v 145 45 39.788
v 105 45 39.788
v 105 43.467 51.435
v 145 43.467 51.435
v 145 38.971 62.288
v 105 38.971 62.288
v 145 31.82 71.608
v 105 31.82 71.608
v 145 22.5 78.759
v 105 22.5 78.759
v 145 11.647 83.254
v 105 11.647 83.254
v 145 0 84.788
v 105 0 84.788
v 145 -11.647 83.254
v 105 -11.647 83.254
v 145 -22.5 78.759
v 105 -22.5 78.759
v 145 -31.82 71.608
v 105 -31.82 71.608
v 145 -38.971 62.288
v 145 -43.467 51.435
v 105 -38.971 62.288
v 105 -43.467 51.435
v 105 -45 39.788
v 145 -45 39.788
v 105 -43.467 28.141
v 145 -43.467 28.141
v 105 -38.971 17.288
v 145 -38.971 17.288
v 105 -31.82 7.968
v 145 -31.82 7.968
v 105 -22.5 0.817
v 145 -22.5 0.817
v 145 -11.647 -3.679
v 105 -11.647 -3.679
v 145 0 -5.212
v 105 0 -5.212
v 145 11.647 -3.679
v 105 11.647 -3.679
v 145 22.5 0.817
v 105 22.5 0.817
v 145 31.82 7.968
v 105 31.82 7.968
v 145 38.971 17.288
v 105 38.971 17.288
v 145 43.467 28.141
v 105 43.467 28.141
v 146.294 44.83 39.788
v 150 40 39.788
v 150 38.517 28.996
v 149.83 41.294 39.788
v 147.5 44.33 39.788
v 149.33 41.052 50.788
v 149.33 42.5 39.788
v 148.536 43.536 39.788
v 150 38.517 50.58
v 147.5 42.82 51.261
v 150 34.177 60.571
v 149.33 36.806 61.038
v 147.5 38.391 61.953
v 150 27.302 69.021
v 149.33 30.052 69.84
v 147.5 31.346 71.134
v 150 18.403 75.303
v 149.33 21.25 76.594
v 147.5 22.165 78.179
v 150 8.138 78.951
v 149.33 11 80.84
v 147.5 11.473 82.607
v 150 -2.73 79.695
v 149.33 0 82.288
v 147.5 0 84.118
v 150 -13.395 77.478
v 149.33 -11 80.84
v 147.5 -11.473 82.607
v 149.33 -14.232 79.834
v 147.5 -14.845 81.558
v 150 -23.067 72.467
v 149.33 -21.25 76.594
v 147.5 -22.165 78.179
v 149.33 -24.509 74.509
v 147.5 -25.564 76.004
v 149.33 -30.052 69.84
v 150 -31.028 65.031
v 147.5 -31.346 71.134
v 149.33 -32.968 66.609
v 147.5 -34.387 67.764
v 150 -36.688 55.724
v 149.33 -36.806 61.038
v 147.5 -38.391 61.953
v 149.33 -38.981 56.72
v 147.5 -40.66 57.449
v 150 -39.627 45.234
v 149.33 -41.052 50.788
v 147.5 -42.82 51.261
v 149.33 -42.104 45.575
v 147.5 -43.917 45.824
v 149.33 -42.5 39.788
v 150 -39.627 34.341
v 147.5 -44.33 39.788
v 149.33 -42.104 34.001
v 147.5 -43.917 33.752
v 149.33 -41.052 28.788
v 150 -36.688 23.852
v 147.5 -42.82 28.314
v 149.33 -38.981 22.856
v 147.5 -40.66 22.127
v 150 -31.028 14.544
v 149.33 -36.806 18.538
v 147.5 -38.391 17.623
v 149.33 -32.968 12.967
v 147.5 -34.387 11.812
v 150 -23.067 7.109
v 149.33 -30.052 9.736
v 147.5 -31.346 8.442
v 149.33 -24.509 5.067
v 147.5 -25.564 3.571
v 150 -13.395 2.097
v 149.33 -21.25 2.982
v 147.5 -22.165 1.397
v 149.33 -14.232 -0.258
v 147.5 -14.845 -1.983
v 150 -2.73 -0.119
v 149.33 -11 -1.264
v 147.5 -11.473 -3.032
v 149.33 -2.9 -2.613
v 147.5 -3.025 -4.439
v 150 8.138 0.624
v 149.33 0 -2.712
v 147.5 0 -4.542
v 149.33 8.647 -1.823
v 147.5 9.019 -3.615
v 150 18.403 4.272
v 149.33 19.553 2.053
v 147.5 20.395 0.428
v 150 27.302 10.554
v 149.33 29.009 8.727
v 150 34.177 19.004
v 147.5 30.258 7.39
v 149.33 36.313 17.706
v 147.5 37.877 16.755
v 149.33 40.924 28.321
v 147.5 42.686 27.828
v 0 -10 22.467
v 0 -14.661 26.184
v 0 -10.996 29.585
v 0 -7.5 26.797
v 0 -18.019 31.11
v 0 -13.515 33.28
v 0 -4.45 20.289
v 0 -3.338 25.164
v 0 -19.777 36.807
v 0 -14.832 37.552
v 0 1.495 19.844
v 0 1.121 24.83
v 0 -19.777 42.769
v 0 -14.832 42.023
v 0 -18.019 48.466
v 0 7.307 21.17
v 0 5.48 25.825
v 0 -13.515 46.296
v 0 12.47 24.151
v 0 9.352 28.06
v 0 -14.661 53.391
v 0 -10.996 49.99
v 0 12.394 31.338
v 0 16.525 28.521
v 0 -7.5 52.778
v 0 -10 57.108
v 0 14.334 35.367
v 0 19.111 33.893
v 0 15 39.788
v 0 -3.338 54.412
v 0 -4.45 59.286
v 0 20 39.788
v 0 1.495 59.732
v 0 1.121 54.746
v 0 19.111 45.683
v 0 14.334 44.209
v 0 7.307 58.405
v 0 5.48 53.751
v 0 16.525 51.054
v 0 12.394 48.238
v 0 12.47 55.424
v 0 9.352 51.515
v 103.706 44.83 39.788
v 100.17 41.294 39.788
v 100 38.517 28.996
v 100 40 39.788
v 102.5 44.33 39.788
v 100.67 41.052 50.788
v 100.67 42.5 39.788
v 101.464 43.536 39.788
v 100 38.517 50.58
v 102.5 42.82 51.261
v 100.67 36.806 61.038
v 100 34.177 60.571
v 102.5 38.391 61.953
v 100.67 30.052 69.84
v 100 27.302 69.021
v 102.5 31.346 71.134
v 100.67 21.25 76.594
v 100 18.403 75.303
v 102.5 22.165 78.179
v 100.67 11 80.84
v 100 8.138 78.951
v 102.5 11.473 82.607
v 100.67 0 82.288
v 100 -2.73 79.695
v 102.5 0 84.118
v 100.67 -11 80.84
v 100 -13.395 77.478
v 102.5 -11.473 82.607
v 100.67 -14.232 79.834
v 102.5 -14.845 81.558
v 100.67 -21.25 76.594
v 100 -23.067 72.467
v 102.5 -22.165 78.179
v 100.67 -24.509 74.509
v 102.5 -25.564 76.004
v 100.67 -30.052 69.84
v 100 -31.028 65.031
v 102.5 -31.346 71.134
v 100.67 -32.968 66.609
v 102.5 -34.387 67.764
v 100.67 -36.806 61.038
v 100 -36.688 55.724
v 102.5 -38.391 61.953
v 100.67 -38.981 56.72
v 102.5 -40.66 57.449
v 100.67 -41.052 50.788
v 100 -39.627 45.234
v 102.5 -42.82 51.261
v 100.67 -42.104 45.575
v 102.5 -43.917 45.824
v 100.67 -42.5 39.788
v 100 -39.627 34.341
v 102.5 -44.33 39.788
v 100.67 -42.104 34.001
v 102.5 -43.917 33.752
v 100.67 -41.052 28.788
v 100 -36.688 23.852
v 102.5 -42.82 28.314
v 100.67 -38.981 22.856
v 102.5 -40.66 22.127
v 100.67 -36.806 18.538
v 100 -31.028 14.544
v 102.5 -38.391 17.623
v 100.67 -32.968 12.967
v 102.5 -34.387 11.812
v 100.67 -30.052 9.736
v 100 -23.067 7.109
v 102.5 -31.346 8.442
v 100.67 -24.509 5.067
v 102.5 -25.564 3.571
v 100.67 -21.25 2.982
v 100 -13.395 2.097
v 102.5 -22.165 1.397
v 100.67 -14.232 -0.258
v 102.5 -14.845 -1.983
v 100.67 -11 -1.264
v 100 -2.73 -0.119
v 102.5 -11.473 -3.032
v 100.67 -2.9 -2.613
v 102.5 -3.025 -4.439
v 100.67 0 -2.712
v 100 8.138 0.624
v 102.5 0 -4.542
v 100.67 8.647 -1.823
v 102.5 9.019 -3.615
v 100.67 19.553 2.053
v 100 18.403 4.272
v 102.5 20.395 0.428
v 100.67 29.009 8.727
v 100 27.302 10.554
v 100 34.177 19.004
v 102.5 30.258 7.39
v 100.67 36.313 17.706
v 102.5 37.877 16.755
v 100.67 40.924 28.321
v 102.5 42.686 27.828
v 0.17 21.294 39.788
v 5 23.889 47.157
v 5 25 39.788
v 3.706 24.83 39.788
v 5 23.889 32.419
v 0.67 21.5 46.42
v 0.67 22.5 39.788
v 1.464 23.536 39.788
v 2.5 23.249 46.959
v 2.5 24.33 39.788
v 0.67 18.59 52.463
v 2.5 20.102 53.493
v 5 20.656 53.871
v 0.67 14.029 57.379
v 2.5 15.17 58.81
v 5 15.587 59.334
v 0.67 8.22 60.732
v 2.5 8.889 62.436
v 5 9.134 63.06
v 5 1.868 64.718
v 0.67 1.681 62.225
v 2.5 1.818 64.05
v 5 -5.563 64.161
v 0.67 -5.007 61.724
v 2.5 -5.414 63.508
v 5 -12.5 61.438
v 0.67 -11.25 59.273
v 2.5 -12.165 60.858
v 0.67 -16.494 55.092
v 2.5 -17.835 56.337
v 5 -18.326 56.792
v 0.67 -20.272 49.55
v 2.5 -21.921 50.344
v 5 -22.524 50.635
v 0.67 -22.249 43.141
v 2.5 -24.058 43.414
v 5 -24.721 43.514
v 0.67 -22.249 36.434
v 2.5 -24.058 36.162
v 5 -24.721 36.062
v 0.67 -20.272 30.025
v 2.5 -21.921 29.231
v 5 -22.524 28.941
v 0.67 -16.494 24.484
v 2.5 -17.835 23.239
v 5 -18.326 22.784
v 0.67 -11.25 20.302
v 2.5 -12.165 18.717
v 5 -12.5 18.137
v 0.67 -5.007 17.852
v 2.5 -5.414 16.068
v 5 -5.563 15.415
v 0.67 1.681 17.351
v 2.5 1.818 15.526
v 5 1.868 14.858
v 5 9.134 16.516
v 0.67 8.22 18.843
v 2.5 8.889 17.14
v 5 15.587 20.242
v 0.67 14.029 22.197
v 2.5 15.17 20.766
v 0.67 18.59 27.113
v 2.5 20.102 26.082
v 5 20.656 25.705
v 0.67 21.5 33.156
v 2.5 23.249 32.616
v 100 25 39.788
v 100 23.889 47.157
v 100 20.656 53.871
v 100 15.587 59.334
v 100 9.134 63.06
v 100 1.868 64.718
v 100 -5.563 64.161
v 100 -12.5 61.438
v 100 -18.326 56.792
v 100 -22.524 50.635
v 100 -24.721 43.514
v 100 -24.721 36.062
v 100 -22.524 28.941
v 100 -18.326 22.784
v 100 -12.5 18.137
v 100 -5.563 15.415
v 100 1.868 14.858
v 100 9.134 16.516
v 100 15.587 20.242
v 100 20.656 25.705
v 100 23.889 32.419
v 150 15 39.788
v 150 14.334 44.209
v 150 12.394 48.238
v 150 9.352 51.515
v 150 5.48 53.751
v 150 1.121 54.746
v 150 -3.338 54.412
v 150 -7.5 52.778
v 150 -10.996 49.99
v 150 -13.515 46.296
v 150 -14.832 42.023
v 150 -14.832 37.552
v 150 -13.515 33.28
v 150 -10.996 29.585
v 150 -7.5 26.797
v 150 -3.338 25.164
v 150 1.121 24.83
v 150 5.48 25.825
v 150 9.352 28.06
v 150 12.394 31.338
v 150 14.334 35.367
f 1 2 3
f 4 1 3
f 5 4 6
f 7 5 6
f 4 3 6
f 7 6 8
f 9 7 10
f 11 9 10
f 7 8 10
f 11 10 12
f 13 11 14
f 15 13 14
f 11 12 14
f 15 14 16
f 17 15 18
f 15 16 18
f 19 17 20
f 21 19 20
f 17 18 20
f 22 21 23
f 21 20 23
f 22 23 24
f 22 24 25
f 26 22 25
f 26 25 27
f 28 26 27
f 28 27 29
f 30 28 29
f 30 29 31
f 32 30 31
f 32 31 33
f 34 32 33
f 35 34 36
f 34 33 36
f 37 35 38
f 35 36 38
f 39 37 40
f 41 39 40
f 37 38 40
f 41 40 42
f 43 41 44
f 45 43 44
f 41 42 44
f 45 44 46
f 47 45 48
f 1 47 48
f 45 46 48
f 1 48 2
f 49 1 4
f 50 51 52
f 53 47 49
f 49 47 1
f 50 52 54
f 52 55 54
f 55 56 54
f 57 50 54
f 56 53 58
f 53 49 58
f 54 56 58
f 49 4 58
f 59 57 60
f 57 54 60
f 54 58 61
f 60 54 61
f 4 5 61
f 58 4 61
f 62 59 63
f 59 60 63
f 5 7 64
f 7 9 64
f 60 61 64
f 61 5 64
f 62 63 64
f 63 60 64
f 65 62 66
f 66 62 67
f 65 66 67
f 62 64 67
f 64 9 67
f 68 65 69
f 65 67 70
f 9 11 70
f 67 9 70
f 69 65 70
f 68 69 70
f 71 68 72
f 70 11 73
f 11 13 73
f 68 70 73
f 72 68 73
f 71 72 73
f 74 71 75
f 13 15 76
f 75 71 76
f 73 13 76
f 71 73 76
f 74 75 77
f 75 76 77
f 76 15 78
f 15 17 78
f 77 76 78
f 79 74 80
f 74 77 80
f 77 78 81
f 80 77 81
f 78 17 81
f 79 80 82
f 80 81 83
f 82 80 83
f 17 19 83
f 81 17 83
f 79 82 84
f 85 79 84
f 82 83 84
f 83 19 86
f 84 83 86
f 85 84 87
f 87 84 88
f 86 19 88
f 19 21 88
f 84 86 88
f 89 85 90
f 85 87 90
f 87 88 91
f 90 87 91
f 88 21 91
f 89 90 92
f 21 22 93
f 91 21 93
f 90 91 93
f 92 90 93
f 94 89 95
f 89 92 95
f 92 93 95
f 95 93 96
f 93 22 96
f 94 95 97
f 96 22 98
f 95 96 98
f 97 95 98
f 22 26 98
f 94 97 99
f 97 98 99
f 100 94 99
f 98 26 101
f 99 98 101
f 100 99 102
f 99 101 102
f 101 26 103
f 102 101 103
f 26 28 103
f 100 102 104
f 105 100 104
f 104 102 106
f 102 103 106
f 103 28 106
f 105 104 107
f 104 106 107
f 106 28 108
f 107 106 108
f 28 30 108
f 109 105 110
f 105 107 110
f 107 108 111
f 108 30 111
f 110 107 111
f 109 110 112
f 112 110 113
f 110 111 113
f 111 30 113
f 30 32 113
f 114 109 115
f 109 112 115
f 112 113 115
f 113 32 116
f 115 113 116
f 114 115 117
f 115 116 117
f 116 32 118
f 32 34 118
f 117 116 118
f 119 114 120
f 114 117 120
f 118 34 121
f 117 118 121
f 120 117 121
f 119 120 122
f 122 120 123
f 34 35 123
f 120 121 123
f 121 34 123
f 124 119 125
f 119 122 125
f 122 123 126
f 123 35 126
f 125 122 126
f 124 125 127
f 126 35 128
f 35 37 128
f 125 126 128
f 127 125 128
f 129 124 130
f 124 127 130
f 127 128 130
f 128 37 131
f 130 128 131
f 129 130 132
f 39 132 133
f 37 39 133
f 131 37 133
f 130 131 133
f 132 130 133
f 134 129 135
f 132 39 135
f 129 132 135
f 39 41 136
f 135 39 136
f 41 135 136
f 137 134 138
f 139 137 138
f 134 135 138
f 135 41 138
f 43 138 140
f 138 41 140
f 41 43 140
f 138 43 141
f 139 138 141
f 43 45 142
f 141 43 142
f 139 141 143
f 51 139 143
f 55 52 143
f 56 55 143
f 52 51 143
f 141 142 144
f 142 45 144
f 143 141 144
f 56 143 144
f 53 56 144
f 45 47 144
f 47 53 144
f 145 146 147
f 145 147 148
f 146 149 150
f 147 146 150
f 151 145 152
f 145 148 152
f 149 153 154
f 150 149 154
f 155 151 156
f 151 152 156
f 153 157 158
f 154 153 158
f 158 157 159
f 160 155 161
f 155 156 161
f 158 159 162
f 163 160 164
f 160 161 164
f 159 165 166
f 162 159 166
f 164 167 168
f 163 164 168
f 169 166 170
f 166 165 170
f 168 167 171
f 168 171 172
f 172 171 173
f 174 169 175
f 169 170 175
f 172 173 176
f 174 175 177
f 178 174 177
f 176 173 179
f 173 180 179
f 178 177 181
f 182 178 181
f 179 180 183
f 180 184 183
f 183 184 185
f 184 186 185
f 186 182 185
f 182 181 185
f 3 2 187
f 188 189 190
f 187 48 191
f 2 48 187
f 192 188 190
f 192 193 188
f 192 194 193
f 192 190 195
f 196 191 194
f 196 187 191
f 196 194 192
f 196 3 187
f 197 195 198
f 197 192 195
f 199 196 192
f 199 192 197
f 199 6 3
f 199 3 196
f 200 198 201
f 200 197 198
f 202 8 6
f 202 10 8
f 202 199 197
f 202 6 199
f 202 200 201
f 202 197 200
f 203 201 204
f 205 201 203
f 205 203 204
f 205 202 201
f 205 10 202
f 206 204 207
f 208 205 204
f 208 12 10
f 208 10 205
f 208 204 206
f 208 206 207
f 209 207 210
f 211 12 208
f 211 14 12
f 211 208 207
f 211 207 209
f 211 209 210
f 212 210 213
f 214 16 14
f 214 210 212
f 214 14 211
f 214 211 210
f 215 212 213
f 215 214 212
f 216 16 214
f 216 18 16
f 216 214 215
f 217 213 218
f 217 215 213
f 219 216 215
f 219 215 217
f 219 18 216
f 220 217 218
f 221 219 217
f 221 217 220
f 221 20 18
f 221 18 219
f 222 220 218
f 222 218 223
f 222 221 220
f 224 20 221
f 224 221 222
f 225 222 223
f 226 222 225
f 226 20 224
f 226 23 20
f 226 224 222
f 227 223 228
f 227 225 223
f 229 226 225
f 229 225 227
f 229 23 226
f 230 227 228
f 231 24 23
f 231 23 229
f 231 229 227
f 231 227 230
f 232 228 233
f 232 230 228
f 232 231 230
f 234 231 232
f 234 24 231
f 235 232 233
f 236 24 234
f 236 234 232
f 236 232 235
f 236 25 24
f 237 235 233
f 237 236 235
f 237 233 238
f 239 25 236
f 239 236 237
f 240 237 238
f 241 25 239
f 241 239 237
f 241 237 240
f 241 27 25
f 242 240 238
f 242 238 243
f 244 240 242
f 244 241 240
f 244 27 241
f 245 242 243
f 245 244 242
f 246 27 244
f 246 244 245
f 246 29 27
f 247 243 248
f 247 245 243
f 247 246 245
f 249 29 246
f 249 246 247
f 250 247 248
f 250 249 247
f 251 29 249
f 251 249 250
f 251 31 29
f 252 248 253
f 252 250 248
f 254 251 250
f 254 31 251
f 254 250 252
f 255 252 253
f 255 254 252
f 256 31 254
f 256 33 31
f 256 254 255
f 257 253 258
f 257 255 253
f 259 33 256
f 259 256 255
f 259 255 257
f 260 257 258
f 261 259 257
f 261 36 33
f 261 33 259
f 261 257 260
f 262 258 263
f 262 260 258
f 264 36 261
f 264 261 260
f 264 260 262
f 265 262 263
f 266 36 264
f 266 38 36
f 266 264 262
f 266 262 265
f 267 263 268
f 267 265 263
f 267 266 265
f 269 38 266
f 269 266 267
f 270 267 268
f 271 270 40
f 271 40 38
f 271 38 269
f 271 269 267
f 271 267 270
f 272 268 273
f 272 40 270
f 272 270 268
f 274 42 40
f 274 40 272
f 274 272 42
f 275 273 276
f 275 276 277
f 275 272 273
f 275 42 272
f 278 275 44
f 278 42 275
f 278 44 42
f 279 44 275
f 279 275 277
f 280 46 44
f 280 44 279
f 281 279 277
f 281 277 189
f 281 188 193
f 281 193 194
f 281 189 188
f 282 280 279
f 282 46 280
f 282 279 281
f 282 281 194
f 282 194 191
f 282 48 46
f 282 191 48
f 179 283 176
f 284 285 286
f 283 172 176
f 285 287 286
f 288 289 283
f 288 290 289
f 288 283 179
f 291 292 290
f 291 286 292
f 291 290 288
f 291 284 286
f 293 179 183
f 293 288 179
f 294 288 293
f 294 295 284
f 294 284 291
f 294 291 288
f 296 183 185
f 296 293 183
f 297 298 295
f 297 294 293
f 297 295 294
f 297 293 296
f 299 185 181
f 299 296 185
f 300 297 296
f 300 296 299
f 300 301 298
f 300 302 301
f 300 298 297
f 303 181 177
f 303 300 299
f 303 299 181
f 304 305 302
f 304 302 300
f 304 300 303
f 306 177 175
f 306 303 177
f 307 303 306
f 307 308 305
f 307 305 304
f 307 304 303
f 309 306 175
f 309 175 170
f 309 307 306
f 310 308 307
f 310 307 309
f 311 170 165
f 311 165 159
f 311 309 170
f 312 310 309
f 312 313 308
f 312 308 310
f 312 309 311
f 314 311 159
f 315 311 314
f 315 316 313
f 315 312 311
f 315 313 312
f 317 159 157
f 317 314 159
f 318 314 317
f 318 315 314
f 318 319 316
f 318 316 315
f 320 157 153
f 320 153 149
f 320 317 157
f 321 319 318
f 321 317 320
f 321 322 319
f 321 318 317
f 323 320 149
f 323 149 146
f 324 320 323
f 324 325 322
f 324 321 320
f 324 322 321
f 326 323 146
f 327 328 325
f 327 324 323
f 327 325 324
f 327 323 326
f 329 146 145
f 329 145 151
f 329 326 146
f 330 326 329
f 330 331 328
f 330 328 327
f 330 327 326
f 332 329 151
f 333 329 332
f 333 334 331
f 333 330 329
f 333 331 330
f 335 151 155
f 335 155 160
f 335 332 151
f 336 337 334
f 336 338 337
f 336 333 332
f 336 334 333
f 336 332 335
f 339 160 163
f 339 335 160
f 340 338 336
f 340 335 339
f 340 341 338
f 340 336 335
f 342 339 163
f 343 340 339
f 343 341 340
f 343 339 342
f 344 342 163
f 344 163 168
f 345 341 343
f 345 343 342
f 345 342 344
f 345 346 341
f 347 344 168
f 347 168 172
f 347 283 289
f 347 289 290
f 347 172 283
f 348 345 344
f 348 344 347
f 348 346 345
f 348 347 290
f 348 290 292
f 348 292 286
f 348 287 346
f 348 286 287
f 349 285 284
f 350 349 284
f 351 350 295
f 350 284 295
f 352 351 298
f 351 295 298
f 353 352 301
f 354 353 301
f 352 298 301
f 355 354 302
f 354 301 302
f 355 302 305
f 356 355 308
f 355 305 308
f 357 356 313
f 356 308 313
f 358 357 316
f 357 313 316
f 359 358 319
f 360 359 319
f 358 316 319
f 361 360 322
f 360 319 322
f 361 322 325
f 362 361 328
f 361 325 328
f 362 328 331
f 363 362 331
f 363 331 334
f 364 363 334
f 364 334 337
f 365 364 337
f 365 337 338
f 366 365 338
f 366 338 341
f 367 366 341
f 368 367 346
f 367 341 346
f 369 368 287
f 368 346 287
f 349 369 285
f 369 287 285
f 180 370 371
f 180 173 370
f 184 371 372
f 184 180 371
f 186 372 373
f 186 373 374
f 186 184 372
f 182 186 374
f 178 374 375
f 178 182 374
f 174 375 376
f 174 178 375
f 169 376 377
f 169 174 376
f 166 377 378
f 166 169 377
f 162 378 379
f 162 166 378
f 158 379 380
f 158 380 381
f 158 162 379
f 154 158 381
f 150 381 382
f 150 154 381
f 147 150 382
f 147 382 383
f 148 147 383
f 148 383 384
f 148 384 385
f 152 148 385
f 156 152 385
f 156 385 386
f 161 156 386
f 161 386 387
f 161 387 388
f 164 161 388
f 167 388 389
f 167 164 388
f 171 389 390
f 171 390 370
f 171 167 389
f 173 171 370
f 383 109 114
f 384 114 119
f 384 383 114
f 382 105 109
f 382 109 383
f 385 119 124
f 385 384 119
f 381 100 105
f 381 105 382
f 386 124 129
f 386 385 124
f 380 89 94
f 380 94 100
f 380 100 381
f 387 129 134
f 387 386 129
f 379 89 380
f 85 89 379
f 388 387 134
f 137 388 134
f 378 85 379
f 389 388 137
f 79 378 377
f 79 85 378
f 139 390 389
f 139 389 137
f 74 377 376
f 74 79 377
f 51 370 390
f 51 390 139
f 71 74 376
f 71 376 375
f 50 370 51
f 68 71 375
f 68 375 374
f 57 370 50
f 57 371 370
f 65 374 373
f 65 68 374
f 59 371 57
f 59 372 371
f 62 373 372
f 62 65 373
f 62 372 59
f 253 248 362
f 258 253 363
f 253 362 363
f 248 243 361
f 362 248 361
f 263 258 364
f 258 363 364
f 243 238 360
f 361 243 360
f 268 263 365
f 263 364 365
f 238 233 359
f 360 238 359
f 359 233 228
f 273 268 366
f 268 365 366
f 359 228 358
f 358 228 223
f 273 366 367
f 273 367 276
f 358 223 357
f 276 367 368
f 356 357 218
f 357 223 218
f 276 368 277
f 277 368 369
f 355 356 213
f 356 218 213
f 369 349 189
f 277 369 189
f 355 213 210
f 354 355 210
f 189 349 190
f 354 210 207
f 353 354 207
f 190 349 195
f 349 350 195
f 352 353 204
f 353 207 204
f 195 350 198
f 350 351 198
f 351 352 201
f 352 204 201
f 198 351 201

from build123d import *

# Parameters (mm, degrees)
F0_R     = 25
F0_R_2   = 15
F1_DEPTH = 100
F2_R     = 25
F2_R_2   = 15
F3_R     = 45
F3_R_2   = 25
F4_DEPTH = 50
F5_R     = 5
F6_R     = 5


with BuildPart() as f1:
    # F0 (on Right) → F1 (new body)
    with BuildSketch(Plane.YZ):
        with Locations((0, 39.787832)):
            Circle(F0_R)
        with Locations((0, 39.787832)):
            Circle(F0_R_2, mode=Mode.SUBTRACT)
    extrude(amount=F1_DEPTH)

    # F2 (on face) + F3 (on face) → F4 (join)
    with BuildSketch(Plane.YZ.offset(100)):
        with Locations((0, 39.787832)):
            Circle(F2_R)
        with Locations((0, 39.787832)):
            Circle(F2_R_2, mode=Mode.SUBTRACT)
    with BuildSketch(Plane.YZ.offset(100)):
        with Locations((0, 39.787832)):
            Circle(F3_R)
        with Locations((0, 39.787832)):
            Circle(F3_R_2, mode=Mode.SUBTRACT)
    extrude(amount=F4_DEPTH)

    # F5
    f5_edges = [f1.edges().sort_by_distance(p)[0] for p in [
        (100, -45, 39.787832),
        (0, -25, 39.787832),
    ]]
    fillet(f5_edges, radius=F5_R)

    # F6
    f6_edges = [f1.edges().sort_by_distance(p)[0] for p in [
        (150, -45, 39.787832),
    ]]
    fillet(f6_edges, radius=F6_R)


solid = f1.part
